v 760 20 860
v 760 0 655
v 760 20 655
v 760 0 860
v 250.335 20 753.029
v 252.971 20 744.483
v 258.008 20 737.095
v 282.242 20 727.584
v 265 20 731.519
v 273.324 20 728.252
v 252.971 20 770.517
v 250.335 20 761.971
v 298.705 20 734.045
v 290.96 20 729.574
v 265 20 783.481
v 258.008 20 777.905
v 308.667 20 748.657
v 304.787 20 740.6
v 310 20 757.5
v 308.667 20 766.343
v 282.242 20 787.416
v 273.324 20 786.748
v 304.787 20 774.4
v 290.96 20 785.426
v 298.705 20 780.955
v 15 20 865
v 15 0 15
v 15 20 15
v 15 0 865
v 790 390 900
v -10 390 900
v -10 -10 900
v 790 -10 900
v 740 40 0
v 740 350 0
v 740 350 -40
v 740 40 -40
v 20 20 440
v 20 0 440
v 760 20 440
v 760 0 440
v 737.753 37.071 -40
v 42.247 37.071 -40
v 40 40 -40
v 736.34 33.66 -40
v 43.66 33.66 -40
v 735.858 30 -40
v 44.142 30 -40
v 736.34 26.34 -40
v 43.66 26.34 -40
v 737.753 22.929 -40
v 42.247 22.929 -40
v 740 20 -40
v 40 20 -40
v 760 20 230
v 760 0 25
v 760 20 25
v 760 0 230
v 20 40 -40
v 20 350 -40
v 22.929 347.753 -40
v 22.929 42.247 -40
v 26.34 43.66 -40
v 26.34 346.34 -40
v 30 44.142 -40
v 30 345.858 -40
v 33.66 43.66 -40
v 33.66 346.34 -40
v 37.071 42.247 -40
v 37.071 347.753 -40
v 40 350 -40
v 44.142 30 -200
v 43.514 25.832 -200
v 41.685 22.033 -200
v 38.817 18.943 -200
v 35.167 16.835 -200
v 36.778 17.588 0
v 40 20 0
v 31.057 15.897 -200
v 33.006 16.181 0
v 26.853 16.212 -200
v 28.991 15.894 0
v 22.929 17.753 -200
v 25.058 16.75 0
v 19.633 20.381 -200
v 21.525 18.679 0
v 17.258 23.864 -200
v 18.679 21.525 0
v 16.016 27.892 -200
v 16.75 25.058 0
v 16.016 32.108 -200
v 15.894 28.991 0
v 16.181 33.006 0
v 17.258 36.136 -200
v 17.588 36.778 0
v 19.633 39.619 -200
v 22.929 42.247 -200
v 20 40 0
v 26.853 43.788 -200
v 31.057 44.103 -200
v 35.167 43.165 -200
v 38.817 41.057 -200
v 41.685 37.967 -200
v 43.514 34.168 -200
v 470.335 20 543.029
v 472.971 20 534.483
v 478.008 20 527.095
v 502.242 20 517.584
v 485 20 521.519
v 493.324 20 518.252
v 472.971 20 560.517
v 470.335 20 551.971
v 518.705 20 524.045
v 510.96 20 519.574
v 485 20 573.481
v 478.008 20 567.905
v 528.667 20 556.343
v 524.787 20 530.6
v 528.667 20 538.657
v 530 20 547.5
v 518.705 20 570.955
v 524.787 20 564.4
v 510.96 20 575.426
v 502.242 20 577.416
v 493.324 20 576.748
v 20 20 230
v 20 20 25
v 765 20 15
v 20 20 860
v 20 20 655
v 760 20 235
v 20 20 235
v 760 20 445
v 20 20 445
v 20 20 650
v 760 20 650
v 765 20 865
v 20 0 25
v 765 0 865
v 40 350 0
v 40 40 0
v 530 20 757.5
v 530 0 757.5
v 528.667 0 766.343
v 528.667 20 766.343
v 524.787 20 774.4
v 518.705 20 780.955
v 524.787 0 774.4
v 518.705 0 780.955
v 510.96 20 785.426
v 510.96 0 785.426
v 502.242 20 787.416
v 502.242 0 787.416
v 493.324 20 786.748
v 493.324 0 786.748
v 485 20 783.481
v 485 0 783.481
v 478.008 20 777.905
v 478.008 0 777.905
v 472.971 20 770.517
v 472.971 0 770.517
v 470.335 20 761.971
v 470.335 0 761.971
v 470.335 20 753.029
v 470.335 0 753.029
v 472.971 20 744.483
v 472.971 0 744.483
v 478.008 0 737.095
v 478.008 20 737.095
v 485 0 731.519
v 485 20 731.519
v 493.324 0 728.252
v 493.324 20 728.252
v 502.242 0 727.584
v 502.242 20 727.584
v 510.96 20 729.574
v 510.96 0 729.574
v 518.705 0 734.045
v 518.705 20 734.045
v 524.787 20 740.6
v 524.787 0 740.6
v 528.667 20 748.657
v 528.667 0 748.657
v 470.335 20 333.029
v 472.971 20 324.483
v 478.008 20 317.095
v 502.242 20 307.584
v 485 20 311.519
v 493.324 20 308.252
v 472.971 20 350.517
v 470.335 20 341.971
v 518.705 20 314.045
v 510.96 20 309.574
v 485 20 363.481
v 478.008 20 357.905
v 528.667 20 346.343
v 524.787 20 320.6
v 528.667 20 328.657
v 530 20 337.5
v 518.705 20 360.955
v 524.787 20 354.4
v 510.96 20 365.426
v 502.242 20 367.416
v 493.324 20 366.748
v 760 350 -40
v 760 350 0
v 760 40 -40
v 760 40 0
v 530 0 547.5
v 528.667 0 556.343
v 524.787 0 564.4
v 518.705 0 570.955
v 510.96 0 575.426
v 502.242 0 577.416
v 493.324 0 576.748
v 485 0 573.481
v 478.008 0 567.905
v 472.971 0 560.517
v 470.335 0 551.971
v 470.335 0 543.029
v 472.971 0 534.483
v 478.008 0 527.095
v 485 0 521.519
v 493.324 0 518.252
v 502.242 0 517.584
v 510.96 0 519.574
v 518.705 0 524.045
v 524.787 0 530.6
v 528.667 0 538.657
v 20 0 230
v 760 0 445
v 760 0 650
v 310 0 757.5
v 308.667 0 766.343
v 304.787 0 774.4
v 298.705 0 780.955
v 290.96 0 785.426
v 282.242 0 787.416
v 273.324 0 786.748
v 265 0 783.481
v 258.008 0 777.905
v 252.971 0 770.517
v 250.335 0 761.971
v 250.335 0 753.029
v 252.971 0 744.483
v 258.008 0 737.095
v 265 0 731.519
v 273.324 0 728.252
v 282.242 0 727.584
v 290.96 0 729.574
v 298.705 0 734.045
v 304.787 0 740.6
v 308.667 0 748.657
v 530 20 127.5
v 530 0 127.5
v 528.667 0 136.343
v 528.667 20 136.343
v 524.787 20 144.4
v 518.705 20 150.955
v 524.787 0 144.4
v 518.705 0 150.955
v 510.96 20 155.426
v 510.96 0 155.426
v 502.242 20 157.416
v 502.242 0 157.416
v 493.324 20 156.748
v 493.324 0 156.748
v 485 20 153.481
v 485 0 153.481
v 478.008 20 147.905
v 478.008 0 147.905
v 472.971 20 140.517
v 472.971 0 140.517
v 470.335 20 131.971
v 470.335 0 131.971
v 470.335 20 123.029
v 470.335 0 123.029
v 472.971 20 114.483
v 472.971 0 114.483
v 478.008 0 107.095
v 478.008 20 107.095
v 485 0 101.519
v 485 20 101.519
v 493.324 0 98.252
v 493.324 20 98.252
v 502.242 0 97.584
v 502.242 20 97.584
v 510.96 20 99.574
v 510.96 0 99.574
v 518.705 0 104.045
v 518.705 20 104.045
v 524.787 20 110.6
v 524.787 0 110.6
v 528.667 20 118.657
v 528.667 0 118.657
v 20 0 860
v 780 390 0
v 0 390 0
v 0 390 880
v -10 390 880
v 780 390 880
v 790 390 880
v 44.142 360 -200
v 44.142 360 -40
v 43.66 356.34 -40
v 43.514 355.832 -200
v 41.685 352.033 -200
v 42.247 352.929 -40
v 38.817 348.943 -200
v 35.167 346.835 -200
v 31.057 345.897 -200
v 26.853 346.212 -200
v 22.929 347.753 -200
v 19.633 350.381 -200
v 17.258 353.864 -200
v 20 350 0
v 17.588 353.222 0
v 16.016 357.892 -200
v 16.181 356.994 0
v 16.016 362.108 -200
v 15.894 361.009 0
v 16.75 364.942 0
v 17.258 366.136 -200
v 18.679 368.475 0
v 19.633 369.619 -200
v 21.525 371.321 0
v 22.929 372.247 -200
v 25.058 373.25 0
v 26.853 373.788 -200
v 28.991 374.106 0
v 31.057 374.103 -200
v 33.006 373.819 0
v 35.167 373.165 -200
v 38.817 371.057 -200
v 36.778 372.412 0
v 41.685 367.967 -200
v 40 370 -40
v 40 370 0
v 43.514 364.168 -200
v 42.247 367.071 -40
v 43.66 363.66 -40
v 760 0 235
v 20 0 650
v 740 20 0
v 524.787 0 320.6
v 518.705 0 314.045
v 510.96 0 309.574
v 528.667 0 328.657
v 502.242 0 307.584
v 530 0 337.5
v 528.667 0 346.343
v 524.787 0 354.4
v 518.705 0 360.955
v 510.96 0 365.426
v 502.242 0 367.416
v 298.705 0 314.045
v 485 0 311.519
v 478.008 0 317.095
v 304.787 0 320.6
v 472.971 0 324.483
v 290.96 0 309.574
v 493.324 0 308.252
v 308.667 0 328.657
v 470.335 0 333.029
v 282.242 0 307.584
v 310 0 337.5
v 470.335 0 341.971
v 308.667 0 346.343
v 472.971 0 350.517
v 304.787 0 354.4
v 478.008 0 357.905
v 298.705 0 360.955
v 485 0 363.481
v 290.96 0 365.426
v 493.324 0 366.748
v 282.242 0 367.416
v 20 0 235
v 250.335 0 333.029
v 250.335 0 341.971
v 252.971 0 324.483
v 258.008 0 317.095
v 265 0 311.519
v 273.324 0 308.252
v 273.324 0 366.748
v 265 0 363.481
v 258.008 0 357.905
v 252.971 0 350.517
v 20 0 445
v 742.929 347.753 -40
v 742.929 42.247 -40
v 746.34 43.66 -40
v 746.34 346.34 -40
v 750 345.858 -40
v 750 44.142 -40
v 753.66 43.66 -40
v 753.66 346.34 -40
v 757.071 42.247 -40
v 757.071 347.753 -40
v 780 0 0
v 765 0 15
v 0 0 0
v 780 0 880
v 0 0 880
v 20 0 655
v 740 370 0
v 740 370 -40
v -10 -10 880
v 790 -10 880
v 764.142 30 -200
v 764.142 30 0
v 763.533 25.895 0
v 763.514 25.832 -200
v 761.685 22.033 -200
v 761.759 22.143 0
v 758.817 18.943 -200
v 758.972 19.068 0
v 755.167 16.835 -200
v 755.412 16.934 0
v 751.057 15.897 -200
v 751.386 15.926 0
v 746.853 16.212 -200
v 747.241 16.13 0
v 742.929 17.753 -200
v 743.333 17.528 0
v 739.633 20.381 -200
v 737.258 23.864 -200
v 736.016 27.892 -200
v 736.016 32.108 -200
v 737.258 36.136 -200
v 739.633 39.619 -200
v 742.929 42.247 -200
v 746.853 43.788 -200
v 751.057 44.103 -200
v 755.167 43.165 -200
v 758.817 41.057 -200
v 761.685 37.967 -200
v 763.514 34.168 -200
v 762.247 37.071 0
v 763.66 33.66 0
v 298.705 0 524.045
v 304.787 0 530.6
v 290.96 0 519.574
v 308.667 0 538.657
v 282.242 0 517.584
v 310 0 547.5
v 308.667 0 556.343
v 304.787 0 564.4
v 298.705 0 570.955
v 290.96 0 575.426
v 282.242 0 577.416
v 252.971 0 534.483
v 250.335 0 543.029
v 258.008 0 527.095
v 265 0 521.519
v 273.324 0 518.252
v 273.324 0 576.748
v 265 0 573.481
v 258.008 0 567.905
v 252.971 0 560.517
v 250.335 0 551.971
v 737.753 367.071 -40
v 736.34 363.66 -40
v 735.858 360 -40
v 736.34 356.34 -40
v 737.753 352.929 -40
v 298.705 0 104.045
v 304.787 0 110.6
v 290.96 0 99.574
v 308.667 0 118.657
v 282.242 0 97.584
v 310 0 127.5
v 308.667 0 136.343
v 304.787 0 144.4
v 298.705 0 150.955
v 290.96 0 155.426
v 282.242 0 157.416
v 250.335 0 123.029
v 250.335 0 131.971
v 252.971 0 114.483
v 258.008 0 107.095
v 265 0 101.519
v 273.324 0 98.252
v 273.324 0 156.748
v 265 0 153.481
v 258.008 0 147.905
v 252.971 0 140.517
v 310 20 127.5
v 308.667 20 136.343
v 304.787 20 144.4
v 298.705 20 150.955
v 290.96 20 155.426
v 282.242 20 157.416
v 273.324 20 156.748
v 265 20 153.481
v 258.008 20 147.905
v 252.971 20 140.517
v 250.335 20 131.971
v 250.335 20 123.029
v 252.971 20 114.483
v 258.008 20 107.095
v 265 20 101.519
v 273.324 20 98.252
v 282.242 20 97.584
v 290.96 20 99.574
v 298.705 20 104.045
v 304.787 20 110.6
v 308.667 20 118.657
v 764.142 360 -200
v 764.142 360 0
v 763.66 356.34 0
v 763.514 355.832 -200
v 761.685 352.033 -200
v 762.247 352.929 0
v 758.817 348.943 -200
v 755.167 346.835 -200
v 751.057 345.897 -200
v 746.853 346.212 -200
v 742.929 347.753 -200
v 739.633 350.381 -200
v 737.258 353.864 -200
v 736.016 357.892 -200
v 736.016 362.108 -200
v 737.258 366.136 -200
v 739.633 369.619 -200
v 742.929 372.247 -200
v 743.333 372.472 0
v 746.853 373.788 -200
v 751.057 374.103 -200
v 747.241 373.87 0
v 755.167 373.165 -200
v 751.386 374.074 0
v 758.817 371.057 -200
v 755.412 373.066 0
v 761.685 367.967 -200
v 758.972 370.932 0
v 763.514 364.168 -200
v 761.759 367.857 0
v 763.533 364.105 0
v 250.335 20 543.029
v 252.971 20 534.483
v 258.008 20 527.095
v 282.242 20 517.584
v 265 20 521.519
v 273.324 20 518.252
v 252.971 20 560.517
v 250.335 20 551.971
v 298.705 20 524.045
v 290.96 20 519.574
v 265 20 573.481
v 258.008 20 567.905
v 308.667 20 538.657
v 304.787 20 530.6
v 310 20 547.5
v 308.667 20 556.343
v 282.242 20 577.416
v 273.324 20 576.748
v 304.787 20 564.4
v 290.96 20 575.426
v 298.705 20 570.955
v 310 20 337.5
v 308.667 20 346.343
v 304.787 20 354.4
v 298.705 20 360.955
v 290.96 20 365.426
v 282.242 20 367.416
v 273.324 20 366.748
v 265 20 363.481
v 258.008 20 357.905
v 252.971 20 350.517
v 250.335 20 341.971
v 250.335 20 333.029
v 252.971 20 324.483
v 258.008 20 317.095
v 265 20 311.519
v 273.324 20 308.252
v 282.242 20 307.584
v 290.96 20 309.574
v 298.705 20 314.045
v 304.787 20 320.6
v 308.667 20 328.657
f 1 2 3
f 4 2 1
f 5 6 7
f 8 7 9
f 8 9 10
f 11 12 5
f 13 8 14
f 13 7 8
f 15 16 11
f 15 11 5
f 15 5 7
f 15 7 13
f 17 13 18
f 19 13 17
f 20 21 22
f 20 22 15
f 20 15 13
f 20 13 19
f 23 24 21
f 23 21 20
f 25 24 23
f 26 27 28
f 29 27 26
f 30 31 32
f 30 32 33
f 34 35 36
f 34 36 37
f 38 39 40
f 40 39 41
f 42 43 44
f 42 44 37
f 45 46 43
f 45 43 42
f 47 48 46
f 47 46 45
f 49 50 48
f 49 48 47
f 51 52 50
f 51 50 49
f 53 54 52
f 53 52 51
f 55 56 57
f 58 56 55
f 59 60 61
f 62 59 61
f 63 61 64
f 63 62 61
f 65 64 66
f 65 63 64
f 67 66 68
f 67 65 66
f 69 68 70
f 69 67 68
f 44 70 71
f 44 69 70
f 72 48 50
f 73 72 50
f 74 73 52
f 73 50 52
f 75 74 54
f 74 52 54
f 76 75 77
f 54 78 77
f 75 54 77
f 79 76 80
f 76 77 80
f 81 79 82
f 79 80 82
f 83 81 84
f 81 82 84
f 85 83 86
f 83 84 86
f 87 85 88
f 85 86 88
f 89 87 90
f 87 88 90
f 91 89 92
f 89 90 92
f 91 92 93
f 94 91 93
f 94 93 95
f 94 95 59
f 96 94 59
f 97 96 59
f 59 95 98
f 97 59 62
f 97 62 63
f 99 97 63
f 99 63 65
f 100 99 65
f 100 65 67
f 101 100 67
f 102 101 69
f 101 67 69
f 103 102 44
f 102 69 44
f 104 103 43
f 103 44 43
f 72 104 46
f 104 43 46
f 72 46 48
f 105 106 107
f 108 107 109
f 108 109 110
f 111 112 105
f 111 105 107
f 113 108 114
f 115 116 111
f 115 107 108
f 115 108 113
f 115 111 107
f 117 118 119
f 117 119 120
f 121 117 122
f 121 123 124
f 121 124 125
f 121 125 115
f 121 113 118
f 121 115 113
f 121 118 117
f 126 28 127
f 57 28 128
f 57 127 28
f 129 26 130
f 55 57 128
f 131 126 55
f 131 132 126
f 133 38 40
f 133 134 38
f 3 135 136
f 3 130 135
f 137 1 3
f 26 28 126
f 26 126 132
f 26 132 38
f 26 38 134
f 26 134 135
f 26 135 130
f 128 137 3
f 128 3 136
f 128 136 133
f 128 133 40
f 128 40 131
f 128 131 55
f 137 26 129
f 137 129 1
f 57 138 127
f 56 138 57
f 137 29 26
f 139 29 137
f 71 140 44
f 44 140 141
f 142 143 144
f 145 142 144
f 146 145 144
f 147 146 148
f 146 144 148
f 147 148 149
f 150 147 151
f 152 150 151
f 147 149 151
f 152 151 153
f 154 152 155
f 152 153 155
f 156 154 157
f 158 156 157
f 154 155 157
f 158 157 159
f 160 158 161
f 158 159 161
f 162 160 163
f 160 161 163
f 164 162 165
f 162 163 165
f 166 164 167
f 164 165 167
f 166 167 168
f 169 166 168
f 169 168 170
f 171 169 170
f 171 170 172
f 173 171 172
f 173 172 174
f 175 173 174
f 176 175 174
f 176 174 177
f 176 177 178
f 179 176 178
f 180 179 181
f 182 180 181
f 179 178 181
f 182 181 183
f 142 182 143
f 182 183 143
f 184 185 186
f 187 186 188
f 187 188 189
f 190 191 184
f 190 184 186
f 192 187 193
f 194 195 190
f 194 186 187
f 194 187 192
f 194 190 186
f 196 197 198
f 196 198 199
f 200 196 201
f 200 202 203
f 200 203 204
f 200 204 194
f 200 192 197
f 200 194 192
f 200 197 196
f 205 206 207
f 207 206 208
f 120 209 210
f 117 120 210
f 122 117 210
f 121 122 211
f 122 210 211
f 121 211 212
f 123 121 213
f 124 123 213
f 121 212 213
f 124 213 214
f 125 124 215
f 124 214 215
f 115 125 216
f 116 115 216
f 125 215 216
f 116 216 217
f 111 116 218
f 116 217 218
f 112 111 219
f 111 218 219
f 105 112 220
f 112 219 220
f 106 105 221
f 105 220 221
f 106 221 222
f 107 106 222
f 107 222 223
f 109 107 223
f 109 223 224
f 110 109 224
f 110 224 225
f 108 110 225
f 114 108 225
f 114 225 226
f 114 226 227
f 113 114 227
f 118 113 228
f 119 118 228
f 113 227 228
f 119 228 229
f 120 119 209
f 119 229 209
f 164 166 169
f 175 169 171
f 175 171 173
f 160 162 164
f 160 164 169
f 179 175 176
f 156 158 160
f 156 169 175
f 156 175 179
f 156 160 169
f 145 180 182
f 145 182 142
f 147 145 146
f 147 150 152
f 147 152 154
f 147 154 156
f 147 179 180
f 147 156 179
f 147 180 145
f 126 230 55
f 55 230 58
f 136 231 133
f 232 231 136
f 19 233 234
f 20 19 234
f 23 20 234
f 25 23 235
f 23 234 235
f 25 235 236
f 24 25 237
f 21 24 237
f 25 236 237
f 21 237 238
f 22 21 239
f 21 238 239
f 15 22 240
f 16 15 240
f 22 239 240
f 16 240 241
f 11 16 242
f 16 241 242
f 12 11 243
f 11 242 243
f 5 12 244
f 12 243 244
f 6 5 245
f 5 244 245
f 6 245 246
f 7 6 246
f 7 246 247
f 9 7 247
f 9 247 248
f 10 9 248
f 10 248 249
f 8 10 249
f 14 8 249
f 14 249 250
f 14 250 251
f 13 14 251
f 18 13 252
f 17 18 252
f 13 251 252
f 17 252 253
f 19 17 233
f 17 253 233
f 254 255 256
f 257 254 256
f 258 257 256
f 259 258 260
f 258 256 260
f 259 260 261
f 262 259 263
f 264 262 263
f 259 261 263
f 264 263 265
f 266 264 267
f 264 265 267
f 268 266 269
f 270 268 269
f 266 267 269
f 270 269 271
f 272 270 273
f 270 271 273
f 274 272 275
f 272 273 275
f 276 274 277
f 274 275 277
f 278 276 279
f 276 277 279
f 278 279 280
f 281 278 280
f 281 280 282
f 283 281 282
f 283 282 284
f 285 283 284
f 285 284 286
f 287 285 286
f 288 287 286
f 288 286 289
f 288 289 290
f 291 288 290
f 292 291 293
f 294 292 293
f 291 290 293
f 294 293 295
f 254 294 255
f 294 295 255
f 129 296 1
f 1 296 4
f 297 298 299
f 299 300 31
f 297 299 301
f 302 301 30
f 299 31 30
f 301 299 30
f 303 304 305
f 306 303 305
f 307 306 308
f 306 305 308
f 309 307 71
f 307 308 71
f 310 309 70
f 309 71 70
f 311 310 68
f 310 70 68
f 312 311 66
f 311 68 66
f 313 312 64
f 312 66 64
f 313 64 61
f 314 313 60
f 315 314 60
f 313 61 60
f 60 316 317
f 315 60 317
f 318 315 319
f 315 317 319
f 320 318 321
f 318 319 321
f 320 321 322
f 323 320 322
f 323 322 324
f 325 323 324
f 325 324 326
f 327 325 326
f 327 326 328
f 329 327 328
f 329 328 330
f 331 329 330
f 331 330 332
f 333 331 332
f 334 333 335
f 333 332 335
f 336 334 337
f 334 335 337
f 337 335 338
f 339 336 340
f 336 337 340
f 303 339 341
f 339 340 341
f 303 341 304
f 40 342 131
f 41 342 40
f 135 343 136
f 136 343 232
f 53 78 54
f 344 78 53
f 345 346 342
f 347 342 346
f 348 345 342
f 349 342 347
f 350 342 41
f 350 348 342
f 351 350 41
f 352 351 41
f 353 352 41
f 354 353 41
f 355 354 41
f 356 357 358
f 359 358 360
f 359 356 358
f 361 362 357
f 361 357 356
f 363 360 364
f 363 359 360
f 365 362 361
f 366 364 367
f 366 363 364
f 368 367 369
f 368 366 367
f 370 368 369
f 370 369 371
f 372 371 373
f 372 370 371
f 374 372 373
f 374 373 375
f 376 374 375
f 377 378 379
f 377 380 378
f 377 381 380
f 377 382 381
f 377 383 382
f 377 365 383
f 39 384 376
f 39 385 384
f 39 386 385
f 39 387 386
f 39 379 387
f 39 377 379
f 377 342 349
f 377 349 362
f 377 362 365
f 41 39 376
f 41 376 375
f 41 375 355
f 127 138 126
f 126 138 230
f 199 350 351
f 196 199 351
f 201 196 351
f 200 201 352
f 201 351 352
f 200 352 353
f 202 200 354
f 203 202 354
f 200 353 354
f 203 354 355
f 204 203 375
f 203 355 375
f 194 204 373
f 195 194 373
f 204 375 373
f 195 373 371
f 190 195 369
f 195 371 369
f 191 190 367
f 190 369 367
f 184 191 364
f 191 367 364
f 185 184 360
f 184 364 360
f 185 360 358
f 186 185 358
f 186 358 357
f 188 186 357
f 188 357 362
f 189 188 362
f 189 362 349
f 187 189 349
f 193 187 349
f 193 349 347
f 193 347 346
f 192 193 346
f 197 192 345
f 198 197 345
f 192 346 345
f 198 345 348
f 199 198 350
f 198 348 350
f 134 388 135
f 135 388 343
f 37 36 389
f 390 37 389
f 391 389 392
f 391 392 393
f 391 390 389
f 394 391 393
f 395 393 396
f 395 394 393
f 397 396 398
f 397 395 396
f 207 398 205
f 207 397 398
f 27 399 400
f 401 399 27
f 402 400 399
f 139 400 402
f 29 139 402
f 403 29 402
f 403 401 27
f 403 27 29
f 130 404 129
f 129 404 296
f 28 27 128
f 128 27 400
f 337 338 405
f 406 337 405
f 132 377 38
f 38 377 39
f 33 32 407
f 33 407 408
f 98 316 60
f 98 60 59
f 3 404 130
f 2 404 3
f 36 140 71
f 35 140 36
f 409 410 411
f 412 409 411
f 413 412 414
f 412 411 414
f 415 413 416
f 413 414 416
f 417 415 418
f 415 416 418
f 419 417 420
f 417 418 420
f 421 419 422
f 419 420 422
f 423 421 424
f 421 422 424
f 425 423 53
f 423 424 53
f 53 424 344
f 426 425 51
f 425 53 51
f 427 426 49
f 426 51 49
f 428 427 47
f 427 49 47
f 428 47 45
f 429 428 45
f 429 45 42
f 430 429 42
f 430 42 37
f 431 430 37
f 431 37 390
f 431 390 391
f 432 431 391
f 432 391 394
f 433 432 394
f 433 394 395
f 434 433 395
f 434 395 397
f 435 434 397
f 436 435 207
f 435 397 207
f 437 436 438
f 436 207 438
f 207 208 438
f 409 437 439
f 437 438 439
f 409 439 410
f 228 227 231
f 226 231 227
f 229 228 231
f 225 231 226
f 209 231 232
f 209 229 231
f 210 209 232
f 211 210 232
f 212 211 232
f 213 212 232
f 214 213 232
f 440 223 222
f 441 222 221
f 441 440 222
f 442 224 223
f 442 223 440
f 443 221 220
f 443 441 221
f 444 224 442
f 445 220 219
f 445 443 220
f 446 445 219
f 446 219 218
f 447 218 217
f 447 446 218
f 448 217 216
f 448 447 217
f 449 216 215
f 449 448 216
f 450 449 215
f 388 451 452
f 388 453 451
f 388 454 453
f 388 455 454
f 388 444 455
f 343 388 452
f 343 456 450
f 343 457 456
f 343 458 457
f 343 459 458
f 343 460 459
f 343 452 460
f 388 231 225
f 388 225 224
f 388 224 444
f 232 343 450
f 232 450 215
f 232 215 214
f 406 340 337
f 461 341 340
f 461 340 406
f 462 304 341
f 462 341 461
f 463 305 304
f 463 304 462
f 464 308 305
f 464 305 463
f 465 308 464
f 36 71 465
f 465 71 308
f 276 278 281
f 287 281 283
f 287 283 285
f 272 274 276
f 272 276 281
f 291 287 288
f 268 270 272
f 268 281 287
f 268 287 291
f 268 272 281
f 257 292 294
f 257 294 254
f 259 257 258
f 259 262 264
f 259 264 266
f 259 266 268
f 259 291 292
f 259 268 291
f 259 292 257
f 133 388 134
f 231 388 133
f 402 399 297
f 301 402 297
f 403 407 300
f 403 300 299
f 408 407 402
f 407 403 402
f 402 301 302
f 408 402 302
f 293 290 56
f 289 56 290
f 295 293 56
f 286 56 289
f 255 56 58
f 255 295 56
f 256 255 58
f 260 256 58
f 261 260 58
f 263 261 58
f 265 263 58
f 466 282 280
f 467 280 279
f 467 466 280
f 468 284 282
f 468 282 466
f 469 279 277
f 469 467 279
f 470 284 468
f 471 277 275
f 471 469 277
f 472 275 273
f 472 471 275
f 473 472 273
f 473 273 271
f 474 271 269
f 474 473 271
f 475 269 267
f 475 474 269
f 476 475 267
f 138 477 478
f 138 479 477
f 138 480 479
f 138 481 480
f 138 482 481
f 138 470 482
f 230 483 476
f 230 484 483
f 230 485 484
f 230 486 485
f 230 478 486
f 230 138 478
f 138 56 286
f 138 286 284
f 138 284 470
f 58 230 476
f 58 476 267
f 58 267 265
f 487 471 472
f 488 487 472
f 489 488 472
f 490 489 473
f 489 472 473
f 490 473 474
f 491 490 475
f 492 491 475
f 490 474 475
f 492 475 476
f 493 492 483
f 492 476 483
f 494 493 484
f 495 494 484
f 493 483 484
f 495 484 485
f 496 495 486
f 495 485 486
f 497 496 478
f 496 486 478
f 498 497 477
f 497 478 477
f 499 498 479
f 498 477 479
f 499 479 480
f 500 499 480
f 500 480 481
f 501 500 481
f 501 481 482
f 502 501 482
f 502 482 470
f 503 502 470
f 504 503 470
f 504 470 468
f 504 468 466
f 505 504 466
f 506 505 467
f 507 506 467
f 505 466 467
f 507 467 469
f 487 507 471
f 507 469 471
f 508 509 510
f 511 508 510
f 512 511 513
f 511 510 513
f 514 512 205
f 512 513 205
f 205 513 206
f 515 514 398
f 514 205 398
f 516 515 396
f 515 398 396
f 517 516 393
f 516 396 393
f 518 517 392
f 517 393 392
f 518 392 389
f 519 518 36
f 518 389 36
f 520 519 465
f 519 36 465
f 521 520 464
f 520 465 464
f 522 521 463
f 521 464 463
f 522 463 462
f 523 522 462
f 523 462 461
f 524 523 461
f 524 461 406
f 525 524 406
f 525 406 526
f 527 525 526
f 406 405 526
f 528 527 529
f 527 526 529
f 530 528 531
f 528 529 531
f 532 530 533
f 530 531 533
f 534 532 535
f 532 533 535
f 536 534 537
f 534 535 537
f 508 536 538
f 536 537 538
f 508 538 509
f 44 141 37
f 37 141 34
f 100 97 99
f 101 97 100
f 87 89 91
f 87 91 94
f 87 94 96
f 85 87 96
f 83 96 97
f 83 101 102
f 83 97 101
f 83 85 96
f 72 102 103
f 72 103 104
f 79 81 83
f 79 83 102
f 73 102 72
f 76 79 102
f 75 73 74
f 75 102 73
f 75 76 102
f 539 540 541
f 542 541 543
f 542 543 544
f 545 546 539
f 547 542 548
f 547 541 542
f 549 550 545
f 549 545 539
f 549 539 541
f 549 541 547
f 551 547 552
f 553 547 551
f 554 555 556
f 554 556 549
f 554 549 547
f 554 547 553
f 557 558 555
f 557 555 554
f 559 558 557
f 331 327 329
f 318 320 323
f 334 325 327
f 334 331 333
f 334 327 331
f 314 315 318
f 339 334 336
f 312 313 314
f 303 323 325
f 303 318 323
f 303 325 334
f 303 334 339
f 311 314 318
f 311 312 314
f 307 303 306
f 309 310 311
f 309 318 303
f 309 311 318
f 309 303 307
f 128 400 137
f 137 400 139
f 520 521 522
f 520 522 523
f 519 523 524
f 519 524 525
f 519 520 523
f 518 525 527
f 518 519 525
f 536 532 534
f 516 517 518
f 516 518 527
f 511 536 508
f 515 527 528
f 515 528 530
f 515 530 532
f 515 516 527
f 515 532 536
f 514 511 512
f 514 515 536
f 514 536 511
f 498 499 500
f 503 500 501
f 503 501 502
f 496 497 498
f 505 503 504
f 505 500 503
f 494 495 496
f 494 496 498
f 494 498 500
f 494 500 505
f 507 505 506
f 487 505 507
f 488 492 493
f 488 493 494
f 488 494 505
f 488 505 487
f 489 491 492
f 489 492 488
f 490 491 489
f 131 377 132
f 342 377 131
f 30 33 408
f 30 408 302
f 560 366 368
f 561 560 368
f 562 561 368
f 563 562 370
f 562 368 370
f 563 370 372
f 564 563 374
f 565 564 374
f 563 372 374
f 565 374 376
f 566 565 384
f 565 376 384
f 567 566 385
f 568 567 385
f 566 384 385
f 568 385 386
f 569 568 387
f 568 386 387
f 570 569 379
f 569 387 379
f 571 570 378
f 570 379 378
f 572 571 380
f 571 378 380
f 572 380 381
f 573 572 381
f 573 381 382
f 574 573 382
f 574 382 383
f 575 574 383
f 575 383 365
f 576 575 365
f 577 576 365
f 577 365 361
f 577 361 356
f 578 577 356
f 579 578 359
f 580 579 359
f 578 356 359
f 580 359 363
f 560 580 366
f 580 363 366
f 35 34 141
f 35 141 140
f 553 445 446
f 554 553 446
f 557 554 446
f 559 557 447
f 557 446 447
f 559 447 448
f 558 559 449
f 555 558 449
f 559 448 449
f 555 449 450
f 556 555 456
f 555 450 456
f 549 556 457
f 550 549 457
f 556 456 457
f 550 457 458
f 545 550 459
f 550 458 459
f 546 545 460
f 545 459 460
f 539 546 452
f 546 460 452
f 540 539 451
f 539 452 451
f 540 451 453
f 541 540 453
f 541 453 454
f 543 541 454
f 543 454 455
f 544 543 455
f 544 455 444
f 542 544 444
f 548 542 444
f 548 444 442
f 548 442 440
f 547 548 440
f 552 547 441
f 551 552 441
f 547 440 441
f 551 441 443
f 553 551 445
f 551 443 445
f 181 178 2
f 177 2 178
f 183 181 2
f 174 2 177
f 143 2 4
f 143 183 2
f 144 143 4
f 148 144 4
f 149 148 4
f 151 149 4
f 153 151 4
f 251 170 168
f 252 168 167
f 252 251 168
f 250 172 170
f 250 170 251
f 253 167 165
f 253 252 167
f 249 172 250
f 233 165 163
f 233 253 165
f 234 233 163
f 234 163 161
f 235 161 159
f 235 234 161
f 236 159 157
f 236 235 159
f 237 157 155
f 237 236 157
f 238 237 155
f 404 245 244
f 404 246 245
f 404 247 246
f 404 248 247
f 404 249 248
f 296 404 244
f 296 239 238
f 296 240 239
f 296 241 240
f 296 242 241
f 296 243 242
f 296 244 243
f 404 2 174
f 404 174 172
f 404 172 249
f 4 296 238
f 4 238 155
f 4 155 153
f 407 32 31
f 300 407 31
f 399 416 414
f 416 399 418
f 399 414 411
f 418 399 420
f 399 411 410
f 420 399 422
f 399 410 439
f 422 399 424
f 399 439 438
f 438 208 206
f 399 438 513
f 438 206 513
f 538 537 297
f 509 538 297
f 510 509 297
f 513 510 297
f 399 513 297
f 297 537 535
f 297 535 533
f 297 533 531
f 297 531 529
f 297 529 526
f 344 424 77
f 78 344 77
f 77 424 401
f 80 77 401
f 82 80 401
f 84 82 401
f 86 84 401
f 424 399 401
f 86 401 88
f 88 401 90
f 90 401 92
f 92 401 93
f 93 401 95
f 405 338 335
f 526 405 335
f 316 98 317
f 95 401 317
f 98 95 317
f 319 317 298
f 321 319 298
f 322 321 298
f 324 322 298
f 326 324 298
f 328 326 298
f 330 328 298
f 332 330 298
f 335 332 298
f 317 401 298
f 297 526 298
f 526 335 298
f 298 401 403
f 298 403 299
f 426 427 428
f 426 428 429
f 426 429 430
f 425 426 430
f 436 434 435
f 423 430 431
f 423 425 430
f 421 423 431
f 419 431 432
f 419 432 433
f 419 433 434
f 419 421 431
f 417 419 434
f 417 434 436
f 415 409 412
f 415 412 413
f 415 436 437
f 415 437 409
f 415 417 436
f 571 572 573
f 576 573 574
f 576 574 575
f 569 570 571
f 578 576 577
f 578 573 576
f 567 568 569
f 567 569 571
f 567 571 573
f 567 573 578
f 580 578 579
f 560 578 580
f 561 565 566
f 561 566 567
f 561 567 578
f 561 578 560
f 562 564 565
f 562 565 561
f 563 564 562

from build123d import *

# Parameters (mm, degrees)
F0_W     = 390
F0_H     = 900
F1_DEPTH = 780
F2_W     = 800
F2_H     = 400
F3_DEPTH = 20
F4_W     = 750
F4_H     = 850
F4_W_2   = 740
F4_H_2   = 205
F4_R     = 30
F5_DEPTH = 20
F6_W     = 740
F6_H     = 350
F6_W_2   = 700
F6_H_2   = 310
F7_DEPTH = 40
F8_R     = 14.142136
F9_DEPTH = 200


with BuildPart() as f1:
    # F0 (on Right) → F1 (new body)
    with BuildSketch(Plane.YZ):
        with Locations((195, 450)):
            Rectangle(F0_W, F0_H)
    extrude(amount=F1_DEPTH)

    # F2 (on face) → F3 (join)
    with BuildSketch(Plane.XY.offset(900)):
        with Locations((390, 190)):
            Rectangle(F2_W, F2_H)
    extrude(amount=-F3_DEPTH)

    # F4 (on face) → F5 (cut)
    with BuildSketch(Plane.XZ):
        with Locations((390, 440)):
            Rectangle(F4_W, F4_H)
        with Locations((390, 127.5)):
            Rectangle(F4_W_2, F4_H_2, mode=Mode.SUBTRACT)
        with Locations((390, 337.5)):
            Rectangle(F4_W_2, F4_H_2, mode=Mode.SUBTRACT)
        with Locations((390, 547.5)):
            Rectangle(F4_W_2, F4_H_2, mode=Mode.SUBTRACT)
        with Locations((390, 757.5)):
            Rectangle(F4_W_2, F4_H_2, mode=Mode.SUBTRACT)
        with Locations((280, 757.5)):
            Circle(F4_R)
        with Locations((500, 757.5)):
            Circle(F4_R)
        with Locations((280, 547.5)):
            Circle(F4_R)
        with Locations((500, 547.5)):
            Circle(F4_R)
        with Locations((280, 337.5)):
            Circle(F4_R)
        with Locations((500, 337.5)):
            Circle(F4_R)
        with Locations((280, 127.5)):
            Circle(F4_R)
        with Locations((500, 127.5)):
            Circle(F4_R)
    extrude(amount=-F5_DEPTH, mode=Mode.SUBTRACT)

    # F6 (on face) → F7 (join)
    with BuildSketch(Plane(origin=(0, 0, 0), x_dir=(1, 0, 0), z_dir=(0, 0, -1))):
        with Locations((390, -195)):
            Rectangle(F6_W, F6_H)
        with Locations((390, -195)):
            Rectangle(F6_W_2, F6_H_2, mode=Mode.SUBTRACT)
    extrude(amount=F7_DEPTH)

    # F8 (on face) → F9 (join)
    with BuildSketch(Plane(origin=(0, 0, 0), x_dir=(1, 0, 0), z_dir=(0, 0, -1))):
        with Locations((30, -30)):
            Circle(F8_R)
        with Locations((750, -30)):
            Circle(F8_R)
        with Locations((30, -360)):
            Circle(F8_R)
        with Locations((750, -360)):
            Circle(F8_R)
    extrude(amount=F9_DEPTH)


solid = f1.part
